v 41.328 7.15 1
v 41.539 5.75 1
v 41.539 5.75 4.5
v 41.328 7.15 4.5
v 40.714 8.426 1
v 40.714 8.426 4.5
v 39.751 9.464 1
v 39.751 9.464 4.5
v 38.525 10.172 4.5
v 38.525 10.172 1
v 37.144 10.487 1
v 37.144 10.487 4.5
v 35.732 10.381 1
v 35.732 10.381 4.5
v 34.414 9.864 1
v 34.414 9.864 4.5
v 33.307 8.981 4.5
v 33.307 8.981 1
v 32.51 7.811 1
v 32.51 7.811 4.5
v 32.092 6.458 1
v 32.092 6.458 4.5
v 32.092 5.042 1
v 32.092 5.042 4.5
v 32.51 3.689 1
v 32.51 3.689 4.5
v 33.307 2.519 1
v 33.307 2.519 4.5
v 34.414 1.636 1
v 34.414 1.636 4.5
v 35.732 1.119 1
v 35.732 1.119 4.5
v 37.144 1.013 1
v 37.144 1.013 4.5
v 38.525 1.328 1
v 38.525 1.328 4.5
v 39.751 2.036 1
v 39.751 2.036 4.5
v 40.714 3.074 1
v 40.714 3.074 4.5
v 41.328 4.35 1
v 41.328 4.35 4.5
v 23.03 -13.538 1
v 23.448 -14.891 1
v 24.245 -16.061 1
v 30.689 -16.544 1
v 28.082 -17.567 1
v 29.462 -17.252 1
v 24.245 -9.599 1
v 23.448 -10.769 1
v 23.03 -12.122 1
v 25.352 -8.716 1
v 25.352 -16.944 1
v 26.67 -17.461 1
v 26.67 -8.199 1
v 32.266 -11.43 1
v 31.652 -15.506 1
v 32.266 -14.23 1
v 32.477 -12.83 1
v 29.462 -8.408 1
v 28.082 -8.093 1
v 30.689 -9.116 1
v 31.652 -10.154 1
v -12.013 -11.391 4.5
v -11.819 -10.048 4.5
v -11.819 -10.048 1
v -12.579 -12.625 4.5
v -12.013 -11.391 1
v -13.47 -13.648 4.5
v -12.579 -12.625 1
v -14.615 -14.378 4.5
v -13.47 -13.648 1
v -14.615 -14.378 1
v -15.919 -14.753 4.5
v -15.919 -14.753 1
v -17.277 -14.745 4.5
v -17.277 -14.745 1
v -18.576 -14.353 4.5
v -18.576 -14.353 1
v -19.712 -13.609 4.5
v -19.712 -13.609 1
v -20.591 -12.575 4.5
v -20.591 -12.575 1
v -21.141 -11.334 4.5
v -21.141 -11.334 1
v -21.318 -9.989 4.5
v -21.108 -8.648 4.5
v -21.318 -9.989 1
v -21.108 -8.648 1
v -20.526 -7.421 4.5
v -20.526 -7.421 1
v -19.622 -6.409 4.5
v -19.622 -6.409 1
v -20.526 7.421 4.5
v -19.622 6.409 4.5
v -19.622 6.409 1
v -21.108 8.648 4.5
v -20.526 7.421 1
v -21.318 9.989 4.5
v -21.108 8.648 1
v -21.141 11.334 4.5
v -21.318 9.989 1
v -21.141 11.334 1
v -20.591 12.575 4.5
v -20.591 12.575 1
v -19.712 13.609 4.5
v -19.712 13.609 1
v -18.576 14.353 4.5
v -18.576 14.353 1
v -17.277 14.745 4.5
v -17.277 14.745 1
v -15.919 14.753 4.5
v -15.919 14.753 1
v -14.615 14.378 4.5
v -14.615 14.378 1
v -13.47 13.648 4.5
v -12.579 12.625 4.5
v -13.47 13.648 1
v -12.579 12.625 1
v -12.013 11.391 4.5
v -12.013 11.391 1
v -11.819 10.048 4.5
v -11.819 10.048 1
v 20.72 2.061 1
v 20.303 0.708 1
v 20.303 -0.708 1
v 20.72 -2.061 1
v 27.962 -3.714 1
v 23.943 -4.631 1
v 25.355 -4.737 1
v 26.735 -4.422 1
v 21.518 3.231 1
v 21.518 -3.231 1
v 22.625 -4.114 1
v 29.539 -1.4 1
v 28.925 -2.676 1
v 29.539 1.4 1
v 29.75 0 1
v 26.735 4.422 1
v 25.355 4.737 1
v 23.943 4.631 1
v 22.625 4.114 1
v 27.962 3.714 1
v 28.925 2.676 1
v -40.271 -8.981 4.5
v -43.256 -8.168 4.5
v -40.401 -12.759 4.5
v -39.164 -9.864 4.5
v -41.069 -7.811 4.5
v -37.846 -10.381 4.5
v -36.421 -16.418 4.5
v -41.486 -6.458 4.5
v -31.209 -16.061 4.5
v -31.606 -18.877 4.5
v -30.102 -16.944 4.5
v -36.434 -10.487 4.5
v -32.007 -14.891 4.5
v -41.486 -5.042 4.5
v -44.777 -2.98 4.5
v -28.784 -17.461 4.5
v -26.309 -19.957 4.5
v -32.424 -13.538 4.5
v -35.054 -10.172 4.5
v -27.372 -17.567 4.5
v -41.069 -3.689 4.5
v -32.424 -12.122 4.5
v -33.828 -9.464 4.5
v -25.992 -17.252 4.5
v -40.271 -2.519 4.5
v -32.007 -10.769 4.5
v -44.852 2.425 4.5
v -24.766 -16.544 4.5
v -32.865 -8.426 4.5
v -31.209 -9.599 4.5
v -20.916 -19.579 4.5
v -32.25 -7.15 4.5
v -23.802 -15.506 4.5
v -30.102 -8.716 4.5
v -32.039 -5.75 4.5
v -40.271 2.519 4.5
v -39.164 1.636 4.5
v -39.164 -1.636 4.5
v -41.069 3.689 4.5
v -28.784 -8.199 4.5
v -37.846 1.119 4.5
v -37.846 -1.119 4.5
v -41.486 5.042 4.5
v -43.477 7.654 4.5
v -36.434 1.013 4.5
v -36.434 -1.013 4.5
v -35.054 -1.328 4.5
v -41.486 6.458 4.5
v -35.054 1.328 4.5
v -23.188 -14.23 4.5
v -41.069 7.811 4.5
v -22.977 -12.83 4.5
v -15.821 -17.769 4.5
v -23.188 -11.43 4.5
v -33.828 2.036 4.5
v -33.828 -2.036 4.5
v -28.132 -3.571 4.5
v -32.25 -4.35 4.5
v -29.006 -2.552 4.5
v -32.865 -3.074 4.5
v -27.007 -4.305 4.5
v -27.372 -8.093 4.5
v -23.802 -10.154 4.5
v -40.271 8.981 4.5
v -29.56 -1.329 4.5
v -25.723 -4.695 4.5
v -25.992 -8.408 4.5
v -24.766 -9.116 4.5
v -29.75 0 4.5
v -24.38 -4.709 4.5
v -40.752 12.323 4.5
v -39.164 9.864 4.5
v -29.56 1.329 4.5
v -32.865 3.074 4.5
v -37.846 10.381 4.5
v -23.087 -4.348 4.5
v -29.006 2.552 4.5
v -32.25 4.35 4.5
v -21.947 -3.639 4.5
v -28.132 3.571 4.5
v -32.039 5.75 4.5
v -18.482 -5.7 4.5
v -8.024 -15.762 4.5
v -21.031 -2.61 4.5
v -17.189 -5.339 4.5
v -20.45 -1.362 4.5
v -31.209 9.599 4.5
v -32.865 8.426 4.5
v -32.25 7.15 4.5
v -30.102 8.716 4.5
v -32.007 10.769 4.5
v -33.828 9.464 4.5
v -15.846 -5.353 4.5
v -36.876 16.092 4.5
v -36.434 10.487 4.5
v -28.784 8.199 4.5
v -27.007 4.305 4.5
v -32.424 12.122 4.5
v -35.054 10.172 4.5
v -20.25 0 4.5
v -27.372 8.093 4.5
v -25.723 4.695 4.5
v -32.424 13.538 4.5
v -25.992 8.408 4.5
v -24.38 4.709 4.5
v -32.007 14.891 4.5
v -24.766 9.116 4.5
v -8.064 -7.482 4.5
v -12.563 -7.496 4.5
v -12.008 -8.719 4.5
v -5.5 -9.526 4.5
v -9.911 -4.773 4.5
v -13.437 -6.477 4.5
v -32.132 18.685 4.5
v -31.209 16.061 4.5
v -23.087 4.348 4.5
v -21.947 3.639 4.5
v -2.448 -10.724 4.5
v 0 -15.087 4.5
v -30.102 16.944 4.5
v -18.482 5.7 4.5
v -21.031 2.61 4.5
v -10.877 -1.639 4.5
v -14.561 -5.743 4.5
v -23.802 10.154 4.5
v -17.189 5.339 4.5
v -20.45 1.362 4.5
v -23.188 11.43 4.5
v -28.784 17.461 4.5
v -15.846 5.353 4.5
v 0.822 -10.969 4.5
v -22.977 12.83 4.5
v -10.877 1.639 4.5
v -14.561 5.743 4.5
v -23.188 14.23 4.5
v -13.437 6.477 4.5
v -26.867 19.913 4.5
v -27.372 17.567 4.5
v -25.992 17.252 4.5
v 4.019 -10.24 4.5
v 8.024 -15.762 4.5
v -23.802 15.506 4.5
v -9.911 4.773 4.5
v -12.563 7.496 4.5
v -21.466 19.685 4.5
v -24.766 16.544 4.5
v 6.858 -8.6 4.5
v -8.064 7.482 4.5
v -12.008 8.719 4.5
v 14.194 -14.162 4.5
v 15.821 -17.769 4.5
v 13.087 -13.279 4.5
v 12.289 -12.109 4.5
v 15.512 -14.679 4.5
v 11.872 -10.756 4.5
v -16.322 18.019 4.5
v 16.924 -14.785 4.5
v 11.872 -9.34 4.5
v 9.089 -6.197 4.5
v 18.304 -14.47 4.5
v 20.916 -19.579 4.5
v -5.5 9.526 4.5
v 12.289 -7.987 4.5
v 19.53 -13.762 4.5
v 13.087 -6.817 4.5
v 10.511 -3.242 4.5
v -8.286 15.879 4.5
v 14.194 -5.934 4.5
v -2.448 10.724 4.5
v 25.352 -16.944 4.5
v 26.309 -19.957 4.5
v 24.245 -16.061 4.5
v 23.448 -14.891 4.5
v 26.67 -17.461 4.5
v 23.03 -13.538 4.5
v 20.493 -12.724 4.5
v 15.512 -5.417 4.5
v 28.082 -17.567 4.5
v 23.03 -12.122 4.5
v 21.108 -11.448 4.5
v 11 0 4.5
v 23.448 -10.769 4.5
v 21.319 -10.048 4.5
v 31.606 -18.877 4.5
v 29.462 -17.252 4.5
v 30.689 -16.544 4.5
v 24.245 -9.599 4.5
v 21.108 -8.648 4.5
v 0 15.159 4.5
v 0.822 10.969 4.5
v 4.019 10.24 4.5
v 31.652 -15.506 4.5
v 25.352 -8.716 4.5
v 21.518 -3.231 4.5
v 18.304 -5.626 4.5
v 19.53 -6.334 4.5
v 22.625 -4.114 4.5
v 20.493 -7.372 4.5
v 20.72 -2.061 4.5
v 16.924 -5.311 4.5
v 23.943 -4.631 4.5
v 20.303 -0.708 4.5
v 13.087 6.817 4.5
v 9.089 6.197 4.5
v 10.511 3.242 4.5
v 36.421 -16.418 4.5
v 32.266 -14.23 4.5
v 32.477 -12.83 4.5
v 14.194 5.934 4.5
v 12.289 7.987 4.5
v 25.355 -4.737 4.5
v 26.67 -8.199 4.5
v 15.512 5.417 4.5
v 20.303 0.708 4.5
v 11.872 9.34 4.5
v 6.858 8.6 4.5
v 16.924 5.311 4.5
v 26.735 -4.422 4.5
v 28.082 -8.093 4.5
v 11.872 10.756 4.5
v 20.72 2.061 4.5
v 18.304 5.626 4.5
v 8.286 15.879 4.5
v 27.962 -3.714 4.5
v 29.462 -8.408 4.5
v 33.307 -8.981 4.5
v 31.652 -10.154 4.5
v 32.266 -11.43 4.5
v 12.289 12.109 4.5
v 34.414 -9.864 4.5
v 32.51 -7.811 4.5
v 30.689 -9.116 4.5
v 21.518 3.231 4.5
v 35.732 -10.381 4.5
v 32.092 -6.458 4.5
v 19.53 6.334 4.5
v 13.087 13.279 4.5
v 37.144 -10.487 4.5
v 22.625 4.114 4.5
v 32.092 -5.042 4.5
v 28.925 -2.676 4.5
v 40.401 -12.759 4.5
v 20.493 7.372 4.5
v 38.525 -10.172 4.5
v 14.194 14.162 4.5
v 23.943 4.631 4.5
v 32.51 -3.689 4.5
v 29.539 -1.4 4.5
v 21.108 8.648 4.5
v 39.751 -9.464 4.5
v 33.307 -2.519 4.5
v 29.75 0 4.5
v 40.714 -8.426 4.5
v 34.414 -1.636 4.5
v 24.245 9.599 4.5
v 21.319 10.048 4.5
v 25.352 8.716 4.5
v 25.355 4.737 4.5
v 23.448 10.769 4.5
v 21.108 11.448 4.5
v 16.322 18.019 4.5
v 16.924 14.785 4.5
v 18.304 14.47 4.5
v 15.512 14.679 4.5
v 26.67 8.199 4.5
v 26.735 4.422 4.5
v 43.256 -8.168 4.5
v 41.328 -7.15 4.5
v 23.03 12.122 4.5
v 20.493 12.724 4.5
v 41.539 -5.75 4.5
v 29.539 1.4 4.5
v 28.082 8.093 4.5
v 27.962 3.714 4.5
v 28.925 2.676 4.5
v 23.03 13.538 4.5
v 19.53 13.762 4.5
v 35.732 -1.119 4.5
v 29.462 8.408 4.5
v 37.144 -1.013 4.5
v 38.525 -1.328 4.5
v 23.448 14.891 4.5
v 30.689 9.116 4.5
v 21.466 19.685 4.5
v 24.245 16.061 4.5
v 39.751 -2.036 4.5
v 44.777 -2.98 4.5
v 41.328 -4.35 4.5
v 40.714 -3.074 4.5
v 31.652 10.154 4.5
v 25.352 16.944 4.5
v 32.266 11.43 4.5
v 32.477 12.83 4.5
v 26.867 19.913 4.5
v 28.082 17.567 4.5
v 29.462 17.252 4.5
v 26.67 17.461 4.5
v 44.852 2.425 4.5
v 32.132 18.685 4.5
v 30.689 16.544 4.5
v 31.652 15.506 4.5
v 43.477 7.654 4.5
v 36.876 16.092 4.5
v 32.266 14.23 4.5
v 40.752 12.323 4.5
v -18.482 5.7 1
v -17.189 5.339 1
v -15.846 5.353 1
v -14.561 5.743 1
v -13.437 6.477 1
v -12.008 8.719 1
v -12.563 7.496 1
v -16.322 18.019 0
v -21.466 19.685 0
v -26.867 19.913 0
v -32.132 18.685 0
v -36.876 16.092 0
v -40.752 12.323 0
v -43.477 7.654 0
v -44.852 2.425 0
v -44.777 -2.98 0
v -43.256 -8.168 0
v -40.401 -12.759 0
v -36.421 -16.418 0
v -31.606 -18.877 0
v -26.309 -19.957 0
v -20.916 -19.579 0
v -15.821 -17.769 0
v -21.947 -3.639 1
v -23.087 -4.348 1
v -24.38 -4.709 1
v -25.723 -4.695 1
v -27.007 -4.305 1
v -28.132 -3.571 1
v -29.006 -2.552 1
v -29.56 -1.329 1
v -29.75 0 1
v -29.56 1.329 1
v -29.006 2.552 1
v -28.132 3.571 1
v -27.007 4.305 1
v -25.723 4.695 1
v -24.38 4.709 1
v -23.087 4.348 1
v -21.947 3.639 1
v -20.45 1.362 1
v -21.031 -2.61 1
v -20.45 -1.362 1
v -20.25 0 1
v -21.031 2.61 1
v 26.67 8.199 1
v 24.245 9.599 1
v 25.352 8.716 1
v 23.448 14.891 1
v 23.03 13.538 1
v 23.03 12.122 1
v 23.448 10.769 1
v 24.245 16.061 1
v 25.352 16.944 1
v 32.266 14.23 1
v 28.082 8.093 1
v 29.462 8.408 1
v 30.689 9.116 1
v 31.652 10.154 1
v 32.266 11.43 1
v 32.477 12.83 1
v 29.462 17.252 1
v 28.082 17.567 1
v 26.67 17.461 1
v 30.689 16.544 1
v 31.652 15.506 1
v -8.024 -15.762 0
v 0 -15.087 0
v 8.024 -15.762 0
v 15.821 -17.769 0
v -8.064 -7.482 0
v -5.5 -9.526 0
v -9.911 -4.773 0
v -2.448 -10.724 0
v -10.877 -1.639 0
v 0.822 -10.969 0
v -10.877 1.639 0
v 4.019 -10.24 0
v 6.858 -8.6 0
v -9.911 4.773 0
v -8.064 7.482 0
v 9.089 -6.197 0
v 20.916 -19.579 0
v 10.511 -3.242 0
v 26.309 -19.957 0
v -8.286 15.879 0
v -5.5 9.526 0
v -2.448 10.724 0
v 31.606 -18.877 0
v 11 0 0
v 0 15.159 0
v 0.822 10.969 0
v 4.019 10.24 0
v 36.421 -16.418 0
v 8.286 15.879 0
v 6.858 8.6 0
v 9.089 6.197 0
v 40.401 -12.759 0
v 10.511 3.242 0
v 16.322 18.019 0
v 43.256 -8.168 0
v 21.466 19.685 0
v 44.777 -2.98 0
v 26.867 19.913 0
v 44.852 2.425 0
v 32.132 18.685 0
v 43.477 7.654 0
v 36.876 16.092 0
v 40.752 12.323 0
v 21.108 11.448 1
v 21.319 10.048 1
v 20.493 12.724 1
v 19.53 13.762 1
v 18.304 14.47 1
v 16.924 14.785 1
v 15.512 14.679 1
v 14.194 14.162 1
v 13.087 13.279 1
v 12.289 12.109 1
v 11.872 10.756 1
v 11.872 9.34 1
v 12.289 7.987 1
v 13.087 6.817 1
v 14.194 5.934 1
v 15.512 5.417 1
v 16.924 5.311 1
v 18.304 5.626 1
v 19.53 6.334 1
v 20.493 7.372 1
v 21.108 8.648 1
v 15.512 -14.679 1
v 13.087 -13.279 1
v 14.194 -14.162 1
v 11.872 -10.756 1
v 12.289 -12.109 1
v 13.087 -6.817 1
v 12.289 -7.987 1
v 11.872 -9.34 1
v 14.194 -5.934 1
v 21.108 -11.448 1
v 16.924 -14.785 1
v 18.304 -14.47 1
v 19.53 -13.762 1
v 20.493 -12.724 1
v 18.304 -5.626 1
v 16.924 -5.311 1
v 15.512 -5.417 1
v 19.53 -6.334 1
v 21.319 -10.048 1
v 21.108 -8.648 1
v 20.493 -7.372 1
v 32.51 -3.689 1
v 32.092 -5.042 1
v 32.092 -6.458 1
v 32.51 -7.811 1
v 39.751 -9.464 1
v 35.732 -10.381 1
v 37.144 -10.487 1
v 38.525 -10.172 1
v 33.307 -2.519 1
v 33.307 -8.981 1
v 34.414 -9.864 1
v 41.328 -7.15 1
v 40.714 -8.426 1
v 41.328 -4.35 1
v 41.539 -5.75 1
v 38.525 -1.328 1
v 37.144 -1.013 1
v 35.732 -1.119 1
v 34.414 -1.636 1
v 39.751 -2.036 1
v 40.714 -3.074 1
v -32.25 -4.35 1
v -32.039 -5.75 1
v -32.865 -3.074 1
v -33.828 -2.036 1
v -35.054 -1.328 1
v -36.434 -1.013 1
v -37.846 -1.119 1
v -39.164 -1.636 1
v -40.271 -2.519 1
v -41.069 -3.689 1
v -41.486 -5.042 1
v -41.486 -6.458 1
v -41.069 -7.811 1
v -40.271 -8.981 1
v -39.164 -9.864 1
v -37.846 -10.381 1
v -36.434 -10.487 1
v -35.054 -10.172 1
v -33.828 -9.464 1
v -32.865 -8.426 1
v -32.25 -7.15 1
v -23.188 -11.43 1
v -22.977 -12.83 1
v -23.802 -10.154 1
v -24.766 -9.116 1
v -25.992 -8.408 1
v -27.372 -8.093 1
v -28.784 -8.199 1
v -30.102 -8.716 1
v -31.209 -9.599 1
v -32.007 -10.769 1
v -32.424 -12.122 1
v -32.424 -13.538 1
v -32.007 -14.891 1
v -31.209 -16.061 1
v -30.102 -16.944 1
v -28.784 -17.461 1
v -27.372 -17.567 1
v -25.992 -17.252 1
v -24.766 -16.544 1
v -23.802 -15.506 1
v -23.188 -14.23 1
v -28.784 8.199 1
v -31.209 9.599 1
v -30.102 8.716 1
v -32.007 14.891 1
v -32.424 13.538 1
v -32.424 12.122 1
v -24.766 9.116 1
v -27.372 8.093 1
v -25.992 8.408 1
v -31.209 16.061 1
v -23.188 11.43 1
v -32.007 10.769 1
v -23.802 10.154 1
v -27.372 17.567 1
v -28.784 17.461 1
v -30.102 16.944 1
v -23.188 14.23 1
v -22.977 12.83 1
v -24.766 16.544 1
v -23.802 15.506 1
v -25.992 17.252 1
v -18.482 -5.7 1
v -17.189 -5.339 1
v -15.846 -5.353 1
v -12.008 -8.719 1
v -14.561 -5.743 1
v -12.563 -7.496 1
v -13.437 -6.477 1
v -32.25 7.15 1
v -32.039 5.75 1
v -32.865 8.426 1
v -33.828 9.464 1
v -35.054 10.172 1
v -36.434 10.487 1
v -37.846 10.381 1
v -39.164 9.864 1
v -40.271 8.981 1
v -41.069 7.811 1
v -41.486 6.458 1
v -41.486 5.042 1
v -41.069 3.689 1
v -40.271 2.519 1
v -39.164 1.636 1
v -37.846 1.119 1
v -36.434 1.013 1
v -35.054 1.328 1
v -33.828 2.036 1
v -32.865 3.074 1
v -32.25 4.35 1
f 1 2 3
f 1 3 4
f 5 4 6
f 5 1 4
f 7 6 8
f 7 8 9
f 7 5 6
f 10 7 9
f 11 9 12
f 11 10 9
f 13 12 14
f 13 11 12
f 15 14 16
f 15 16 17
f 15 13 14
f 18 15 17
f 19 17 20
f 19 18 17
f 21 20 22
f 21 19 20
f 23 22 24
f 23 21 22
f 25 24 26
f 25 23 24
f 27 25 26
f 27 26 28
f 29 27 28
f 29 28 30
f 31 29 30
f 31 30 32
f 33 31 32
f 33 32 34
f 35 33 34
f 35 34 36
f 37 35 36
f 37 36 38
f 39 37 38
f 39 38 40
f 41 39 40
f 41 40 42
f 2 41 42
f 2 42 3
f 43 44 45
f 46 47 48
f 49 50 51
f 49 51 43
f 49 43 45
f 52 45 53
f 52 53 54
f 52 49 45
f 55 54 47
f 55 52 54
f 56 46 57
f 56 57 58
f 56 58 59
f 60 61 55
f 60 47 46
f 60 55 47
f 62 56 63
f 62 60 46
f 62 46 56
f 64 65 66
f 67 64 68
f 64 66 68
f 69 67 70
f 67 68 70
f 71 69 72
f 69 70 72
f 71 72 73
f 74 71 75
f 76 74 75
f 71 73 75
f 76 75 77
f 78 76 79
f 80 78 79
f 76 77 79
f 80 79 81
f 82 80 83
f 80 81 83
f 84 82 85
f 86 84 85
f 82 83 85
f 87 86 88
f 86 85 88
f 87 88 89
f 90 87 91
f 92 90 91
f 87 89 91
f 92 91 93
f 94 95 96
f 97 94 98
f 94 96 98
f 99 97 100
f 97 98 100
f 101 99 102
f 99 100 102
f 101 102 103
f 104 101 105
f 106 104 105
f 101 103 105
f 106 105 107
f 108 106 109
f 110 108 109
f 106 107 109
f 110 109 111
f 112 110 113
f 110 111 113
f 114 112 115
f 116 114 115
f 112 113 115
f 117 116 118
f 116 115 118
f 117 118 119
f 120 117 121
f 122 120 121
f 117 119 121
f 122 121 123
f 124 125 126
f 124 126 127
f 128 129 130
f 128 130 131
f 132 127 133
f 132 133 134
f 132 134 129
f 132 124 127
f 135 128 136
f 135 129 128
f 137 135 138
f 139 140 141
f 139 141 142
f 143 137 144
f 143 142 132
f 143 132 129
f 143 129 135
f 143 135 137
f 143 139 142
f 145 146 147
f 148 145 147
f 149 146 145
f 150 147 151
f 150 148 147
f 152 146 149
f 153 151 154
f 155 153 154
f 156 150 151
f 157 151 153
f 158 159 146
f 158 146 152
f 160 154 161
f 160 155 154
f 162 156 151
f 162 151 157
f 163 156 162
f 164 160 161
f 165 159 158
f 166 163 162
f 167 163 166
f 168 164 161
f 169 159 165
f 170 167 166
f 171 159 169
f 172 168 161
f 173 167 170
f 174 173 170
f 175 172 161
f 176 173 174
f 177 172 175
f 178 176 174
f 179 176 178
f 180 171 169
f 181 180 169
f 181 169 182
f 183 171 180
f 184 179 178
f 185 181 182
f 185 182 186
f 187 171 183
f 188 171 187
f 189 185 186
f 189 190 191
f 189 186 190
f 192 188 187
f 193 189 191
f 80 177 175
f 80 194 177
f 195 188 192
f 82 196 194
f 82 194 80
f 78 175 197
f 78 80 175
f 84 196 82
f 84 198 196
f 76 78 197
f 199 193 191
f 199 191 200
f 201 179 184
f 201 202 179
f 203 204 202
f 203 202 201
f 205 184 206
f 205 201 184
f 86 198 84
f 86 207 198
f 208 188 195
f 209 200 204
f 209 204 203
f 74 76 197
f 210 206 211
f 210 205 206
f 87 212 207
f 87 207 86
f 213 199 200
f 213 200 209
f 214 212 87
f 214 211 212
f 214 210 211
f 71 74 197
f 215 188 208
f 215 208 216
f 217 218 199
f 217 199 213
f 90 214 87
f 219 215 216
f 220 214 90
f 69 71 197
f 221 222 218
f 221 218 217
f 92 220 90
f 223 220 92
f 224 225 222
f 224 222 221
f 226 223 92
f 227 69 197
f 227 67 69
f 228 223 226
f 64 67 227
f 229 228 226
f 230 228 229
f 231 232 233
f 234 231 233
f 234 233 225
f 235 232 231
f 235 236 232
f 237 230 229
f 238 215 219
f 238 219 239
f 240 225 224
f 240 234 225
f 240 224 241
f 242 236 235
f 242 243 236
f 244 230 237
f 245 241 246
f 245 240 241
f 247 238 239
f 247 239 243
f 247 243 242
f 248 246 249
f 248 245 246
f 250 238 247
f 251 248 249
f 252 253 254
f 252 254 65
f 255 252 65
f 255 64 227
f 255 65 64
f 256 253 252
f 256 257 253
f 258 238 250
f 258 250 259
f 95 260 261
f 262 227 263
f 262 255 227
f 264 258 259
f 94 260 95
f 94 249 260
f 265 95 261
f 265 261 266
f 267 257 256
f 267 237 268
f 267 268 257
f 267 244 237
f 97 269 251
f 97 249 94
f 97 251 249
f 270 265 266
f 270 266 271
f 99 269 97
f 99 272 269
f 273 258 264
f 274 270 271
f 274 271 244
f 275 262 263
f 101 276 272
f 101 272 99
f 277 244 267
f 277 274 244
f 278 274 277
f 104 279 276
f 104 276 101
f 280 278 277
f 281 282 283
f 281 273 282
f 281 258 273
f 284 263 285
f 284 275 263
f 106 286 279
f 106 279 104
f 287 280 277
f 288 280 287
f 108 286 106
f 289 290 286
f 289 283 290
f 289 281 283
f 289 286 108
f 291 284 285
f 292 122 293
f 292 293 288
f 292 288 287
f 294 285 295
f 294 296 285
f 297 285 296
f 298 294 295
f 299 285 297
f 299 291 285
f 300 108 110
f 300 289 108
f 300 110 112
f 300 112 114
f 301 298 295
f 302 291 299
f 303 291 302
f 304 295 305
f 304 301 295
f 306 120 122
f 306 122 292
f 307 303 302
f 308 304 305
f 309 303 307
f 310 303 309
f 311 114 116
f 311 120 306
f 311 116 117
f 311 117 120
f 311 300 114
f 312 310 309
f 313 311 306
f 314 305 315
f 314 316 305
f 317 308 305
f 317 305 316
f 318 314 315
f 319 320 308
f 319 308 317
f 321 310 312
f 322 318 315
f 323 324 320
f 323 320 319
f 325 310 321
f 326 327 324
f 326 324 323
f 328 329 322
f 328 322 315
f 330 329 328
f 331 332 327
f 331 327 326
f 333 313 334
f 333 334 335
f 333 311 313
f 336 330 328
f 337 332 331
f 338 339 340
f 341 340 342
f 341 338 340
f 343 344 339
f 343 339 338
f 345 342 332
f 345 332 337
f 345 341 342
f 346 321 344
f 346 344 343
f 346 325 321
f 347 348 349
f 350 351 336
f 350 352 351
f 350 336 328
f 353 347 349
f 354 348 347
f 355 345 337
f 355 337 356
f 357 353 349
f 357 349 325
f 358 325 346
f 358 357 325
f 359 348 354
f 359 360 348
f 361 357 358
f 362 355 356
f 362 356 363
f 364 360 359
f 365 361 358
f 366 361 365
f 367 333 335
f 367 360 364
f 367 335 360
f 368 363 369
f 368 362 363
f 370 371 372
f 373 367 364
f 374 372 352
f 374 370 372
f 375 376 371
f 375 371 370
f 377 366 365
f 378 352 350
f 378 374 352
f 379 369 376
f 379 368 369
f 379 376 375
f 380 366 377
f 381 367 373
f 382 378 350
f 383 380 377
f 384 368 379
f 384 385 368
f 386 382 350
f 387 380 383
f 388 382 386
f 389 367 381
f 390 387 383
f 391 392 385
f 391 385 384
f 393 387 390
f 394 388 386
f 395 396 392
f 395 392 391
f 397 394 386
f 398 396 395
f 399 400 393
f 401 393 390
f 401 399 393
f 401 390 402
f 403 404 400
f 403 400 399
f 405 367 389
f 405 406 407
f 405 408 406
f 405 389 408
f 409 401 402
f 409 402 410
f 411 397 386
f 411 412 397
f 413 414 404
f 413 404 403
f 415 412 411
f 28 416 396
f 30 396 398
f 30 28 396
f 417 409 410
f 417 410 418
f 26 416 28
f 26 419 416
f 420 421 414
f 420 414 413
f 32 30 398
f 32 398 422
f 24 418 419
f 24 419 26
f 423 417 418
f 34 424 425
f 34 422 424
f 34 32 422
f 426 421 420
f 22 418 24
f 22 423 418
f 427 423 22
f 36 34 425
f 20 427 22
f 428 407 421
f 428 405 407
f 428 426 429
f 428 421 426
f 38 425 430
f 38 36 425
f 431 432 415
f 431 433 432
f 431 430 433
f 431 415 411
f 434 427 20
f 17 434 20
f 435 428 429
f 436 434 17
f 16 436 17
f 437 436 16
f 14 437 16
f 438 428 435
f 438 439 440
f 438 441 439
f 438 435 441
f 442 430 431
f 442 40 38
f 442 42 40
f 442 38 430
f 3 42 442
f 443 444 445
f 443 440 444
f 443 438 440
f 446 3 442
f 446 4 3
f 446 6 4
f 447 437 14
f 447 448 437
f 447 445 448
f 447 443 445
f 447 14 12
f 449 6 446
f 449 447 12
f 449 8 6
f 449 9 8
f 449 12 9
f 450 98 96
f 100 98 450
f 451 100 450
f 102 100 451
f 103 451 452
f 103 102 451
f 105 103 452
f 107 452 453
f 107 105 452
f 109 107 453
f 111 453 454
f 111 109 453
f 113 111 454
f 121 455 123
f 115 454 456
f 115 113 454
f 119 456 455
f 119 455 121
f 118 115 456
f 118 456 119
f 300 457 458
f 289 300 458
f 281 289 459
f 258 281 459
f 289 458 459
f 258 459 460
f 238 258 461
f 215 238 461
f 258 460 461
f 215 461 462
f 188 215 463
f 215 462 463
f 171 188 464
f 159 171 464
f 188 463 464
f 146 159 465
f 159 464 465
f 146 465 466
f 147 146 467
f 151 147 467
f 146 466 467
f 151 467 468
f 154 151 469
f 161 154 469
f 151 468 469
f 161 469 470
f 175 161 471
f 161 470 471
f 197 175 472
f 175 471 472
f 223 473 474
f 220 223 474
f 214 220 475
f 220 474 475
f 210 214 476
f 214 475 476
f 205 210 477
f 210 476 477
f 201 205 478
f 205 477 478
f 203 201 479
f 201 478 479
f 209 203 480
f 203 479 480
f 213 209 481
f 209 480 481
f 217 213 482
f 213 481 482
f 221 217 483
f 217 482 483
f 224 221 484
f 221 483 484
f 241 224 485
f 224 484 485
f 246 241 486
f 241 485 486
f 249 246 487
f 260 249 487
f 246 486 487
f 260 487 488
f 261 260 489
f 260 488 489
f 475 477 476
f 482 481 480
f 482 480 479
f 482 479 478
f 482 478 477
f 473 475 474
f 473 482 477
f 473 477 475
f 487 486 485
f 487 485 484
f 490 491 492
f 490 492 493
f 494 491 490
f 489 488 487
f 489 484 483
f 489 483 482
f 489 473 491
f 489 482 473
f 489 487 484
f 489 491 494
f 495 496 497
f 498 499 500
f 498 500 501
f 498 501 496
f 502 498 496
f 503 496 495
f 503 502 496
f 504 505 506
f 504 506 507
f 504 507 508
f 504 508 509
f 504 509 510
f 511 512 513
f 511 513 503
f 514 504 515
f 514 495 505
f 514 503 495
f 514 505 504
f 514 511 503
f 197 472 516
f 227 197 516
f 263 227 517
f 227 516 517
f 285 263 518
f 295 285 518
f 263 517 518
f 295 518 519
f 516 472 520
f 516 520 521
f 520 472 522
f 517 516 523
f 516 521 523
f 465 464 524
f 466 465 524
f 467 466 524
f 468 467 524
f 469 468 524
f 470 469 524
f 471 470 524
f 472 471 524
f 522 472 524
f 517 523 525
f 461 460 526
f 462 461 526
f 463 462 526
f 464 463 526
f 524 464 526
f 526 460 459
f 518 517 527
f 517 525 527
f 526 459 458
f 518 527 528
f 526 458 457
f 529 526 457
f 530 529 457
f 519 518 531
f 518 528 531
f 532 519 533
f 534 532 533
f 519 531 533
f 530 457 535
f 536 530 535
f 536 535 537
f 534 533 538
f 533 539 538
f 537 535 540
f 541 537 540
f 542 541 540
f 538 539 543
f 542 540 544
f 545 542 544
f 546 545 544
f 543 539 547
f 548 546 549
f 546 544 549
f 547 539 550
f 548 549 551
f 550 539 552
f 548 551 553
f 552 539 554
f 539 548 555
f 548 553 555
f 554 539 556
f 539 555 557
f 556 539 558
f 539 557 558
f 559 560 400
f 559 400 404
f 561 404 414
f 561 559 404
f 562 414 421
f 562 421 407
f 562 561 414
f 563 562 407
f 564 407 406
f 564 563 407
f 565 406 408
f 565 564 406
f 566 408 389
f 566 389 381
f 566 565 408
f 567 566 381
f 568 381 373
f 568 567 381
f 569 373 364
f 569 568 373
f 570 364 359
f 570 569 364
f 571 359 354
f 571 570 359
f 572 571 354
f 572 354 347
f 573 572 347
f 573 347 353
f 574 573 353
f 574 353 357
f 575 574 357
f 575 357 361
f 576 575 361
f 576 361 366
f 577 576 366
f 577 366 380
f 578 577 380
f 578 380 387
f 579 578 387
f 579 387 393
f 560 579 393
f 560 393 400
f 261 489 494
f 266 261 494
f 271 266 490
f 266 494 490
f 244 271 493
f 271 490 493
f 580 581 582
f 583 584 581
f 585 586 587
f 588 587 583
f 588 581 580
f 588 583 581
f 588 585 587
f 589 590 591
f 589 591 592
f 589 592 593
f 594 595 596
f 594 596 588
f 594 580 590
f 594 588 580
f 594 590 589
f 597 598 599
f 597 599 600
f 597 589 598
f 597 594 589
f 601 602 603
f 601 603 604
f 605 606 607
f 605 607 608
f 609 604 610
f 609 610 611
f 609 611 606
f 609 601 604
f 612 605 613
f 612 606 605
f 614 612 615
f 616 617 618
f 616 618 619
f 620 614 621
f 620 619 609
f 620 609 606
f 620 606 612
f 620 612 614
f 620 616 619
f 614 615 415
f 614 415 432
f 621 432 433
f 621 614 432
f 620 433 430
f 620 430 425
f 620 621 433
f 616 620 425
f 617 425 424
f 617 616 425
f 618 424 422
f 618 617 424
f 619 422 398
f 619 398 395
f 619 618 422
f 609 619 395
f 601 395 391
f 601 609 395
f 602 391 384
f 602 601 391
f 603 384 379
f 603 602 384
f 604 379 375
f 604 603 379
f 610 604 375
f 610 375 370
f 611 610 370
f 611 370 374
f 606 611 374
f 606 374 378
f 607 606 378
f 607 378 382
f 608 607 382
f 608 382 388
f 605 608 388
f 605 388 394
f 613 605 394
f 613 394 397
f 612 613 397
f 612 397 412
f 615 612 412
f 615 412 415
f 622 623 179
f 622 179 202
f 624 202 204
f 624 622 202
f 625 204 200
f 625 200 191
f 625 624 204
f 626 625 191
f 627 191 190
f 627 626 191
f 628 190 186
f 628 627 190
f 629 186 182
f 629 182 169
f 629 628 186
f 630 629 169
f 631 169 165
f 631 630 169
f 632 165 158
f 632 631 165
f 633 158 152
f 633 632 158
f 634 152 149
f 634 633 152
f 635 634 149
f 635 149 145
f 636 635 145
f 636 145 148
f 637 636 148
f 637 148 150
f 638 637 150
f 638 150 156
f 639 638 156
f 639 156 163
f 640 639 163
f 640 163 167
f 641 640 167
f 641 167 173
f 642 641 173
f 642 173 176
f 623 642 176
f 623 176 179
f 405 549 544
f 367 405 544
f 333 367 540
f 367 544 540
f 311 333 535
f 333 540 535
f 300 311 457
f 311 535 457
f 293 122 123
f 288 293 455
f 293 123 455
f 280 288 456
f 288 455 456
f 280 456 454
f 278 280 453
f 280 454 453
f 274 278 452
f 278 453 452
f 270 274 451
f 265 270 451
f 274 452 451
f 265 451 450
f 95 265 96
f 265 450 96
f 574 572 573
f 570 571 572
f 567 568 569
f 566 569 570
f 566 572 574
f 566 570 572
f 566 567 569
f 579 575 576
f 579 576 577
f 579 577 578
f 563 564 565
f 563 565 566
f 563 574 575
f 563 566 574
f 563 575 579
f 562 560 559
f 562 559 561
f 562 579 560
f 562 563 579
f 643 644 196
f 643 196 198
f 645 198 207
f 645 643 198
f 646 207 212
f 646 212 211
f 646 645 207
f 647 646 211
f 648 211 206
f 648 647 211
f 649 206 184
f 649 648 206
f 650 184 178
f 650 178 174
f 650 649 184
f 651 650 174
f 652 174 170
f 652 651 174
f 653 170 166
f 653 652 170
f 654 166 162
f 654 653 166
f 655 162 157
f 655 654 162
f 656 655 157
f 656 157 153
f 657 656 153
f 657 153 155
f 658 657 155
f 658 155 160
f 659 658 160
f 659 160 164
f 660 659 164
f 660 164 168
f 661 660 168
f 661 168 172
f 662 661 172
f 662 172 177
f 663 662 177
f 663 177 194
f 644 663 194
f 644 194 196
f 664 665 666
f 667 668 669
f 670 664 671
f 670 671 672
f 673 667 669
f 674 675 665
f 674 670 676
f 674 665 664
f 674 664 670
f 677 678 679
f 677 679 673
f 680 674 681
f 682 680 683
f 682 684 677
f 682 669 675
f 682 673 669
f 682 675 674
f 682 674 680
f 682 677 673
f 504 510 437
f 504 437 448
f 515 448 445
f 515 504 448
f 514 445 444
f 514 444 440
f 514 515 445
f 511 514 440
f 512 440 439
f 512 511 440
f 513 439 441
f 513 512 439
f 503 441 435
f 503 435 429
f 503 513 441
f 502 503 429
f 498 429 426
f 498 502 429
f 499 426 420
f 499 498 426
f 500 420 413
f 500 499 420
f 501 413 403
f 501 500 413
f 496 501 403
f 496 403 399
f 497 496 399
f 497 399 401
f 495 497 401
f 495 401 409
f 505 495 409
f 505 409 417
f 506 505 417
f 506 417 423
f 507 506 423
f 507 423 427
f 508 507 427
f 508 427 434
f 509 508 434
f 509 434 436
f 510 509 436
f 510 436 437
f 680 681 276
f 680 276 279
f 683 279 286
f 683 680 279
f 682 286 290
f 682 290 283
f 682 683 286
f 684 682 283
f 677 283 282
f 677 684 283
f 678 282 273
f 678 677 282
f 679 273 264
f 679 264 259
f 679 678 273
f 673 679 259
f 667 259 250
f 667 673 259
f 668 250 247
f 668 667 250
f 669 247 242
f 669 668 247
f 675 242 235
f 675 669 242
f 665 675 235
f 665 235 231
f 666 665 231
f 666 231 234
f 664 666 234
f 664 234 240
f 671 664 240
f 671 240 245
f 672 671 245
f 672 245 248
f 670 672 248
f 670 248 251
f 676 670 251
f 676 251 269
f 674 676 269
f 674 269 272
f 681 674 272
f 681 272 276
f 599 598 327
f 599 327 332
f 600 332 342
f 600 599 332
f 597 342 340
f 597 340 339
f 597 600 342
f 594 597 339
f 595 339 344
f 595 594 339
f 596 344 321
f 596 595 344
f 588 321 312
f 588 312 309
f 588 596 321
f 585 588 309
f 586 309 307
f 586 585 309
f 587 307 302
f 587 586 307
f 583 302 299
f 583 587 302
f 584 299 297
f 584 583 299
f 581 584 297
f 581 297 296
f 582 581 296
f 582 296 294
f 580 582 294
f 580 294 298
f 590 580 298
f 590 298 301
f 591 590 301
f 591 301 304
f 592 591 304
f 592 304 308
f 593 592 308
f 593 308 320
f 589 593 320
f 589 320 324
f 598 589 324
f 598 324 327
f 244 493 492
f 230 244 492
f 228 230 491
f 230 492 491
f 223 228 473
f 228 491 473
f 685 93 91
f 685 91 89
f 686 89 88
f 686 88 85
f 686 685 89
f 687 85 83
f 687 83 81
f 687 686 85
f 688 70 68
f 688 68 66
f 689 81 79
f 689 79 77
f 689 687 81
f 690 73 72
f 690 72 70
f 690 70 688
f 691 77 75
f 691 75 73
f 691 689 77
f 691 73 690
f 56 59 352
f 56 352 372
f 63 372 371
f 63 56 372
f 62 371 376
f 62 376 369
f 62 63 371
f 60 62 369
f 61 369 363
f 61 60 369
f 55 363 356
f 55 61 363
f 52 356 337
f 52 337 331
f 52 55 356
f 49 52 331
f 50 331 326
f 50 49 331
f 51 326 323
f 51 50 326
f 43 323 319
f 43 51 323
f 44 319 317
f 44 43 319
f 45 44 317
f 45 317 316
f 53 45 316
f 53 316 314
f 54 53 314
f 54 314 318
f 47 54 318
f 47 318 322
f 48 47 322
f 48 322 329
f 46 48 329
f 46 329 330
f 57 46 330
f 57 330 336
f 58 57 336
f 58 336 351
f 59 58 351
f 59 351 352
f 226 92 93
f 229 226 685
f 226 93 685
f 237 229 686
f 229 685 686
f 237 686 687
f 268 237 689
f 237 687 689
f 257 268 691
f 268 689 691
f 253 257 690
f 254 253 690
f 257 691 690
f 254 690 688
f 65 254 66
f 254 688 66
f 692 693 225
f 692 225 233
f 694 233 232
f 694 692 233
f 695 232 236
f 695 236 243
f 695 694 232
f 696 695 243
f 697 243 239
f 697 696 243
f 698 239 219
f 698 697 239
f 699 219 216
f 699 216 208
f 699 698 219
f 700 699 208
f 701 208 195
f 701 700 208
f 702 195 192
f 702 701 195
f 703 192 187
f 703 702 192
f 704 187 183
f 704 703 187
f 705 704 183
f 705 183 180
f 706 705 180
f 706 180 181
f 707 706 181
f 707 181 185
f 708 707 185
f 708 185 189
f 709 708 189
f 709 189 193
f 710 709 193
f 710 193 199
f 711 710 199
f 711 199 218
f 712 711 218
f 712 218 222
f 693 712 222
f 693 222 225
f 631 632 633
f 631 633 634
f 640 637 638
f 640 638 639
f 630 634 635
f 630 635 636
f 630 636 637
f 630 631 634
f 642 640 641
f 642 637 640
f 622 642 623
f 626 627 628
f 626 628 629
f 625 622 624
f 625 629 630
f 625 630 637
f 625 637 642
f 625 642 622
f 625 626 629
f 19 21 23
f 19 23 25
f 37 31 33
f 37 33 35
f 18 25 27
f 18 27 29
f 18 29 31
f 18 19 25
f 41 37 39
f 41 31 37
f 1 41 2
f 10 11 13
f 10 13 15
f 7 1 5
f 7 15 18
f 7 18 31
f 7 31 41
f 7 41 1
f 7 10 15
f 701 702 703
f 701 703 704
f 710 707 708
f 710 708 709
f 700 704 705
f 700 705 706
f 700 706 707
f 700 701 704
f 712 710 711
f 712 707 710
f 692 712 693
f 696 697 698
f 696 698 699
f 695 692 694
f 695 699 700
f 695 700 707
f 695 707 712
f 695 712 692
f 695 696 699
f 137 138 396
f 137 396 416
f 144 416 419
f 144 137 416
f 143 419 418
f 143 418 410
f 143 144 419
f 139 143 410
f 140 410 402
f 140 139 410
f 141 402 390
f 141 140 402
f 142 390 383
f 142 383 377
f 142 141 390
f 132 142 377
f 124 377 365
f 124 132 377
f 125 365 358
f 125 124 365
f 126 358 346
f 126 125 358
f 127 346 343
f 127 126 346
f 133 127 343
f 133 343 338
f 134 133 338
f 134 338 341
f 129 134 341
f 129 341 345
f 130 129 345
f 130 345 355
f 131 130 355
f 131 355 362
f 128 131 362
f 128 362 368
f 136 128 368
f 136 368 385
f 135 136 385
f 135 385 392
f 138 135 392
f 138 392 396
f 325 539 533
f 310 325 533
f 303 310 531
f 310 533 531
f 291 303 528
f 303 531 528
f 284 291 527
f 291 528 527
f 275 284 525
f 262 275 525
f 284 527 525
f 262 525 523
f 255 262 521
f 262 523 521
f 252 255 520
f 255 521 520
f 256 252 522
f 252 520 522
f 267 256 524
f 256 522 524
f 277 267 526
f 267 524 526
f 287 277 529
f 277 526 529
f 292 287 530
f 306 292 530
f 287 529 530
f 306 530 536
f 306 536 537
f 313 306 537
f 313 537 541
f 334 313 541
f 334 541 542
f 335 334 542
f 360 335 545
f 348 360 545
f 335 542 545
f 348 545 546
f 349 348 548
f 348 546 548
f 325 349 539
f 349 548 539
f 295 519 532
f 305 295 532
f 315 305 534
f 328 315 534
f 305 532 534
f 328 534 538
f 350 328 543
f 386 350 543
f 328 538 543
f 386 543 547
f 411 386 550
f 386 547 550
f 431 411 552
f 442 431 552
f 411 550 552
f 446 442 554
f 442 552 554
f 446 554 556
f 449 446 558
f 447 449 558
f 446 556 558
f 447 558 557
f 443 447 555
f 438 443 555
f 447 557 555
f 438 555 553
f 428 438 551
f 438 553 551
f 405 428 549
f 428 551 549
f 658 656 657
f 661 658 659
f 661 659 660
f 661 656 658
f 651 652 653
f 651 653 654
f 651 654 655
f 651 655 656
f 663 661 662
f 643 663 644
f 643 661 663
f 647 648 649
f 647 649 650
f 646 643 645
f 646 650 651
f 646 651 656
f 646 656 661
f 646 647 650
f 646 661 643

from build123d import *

# Parameters (mm, degrees)
F0_R     = 4.75
F1_DEPTH = 4.5
F2_DEPTH = 1


# Not quite as in the source:
# - a feature names something its author has since deleted; it is built from what else it names


with BuildPart() as f1:
    # F0 (on Top) → F1 (new body)
    with BuildSketch(Plane.XY):
        with BuildLine():
            ThreePointArc((-15.8212677669, -17.7693802535), (0, -15.0870091218), (15.8212677669, -17.7693802535))
            ThreePointArc((15.8212677669, -17.7693802535), (44.9980398453, -0.2800041916), (16.3223672692, 18.019397609))
            ThreePointArc((16.3223672692, 18.019397609), (0, 15.1589625906), (-16.3223672692, 18.019397609))
            ThreePointArc((-16.3223672692, 18.019397609), (-44.9980398453, -0.2800041916), (-15.8212677669, -17.7693802535))
        make_face()
        with Locations((-27.7271234226, -12.8301069662)):
            Circle(F0_R, mode=Mode.SUBTRACT)
        with BuildLine():
            ThreePointArc((-11.8187225704, -10.0480051668), (-18.5761593137, -14.3529671553), (-19.6219637164, -6.409294062))
            ThreePointArc((-19.6219637164, -6.409294062), (-14.5612858272, -5.7430431784), (-11.8187225704, -10.0480051668))
        make_face(mode=Mode.SUBTRACT)
        with Locations((-36.7892470891, -5.75)):
            Circle(F0_R, mode=Mode.SUBTRACT)
        with Locations((16.5687225704, -10.0480051668)):
            Circle(F0_R, mode=Mode.SUBTRACT)
        with Locations((27.7271234226, -12.8301069662)):
            Circle(F0_R, mode=Mode.SUBTRACT)
        with Locations((36.7892470891, -5.75)):
            Circle(F0_R, mode=Mode.SUBTRACT)
        with BuildLine():
            ThreePointArc((-21.946758854, 3.6387111048), (-20.6950380116, 2.0074367433), (-20.25, 0))
            ThreePointArc((-20.25, 0), (-20.6950380116, -2.0074367433), (-21.946758854, -3.6387111048))
            ThreePointArc((-21.946758854, -3.6387111048), (-29.75, 0), (-21.946758854, 3.6387111048))
        make_face(mode=Mode.SUBTRACT)
        with Locations((-36.7892470891, 5.75)):
            Circle(F0_R, mode=Mode.SUBTRACT)
        with Locations((-27.7271234226, 12.8301069662)):
            Circle(F0_R, mode=Mode.SUBTRACT)
        with BuildLine():
            ThreePointArc((-11.8187225704, 10.0480051668), (-14.5612858272, 5.7430431784), (-19.6219637164, 6.409294062))
            ThreePointArc((-19.6219637164, 6.409294062), (-18.5761593137, 14.3529671553), (-11.8187225704, 10.0480051668))
        make_face(mode=Mode.SUBTRACT)
        with BuildLine():
            ThreePointArc((-11, 0), (0, 11), (11, 0))
            ThreePointArc((11, 0), (0, -11), (-11, 0))
        make_face(mode=Mode.SUBTRACT)
        with Locations((25, 0)):
            Circle(F0_R, mode=Mode.SUBTRACT)
        with Locations((36.7892470891, 5.75)):
            Circle(F0_R, mode=Mode.SUBTRACT)
        with Locations((16.5687225704, 10.0480051668)):
            Circle(F0_R, mode=Mode.SUBTRACT)
        with Locations((27.7271234226, 12.8301069662)):
            Circle(F0_R, mode=Mode.SUBTRACT)
    extrude(amount=F1_DEPTH)

    # F0 (on Top) → F2 (join)
    with BuildSketch(Plane.XY):
        with BuildLine():
            Line((-25, 0), (-20.25, 0))
            ThreePointArc((-20.25, 0), (-20.6950380116, 2.0074367433), (-21.946758854, 3.6387111048))
            Line((-21.946758854, 3.6387111048), (-25, 0))
        make_face()
        with BuildLine():
            Line((-25, 0), (-21.946758854, 3.6387111048))
            ThreePointArc((-21.946758854, 3.6387111048), (-29.75, 0), (-21.946758854, -3.6387111048))
            Line((-21.946758854, -3.6387111048), (-25, 0))
        make_face()
        with BuildLine():
            ThreePointArc((-21.946758854, -3.6387111048), (-20.6950380116, -2.0074367433), (-20.25, 0))
            Line((-20.25, 0), (-25, 0))
            Line((-25, 0), (-21.946758854, -3.6387111048))
        make_face()
        with Locations((25, 0)):
            Circle(F0_R)
        with BuildLine():
            ThreePointArc((-11.8187225704, 10.0480051668), (-18.5761593137, 14.3529671553), (-19.6219637164, 6.409294062))
            ThreePointArc((-19.6219637164, 6.409294062), (-14.5612858272, 5.7430431784), (-11.8187225704, 10.0480051668))
        make_face()
        with Locations((-27.7271234226, 12.8301069662)):
            Circle(F0_R)
        with Locations((-36.7892470891, 5.75)):
            Circle(F0_R)
        with Locations((-36.7892470891, -5.75)):
            Circle(F0_R)
        with Locations((-27.7271234226, -12.8301069662)):
            Circle(F0_R)
        with BuildLine():
            ThreePointArc((-11.8187225704, -10.0480051668), (-14.5612858272, -5.7430431784), (-19.6219637164, -6.409294062))
            ThreePointArc((-19.6219637164, -6.409294062), (-18.5761593137, -14.3529671553), (-11.8187225704, -10.0480051668))
        make_face()
        with Locations((16.5687225704, 10.0480051668)):
            Circle(F0_R)
        with Locations((27.7271234226, 12.8301069662)):
            Circle(F0_R)
        with Locations((36.7892470891, 5.75)):
            Circle(F0_R)
        with Locations((36.7892470891, -5.75)):
            Circle(F0_R)
        with Locations((27.7271234226, -12.8301069662)):
            Circle(F0_R)
        with Locations((16.5687225704, -10.0480051668)):
            Circle(F0_R)
    extrude(amount=F2_DEPTH)


solid = f1.part
